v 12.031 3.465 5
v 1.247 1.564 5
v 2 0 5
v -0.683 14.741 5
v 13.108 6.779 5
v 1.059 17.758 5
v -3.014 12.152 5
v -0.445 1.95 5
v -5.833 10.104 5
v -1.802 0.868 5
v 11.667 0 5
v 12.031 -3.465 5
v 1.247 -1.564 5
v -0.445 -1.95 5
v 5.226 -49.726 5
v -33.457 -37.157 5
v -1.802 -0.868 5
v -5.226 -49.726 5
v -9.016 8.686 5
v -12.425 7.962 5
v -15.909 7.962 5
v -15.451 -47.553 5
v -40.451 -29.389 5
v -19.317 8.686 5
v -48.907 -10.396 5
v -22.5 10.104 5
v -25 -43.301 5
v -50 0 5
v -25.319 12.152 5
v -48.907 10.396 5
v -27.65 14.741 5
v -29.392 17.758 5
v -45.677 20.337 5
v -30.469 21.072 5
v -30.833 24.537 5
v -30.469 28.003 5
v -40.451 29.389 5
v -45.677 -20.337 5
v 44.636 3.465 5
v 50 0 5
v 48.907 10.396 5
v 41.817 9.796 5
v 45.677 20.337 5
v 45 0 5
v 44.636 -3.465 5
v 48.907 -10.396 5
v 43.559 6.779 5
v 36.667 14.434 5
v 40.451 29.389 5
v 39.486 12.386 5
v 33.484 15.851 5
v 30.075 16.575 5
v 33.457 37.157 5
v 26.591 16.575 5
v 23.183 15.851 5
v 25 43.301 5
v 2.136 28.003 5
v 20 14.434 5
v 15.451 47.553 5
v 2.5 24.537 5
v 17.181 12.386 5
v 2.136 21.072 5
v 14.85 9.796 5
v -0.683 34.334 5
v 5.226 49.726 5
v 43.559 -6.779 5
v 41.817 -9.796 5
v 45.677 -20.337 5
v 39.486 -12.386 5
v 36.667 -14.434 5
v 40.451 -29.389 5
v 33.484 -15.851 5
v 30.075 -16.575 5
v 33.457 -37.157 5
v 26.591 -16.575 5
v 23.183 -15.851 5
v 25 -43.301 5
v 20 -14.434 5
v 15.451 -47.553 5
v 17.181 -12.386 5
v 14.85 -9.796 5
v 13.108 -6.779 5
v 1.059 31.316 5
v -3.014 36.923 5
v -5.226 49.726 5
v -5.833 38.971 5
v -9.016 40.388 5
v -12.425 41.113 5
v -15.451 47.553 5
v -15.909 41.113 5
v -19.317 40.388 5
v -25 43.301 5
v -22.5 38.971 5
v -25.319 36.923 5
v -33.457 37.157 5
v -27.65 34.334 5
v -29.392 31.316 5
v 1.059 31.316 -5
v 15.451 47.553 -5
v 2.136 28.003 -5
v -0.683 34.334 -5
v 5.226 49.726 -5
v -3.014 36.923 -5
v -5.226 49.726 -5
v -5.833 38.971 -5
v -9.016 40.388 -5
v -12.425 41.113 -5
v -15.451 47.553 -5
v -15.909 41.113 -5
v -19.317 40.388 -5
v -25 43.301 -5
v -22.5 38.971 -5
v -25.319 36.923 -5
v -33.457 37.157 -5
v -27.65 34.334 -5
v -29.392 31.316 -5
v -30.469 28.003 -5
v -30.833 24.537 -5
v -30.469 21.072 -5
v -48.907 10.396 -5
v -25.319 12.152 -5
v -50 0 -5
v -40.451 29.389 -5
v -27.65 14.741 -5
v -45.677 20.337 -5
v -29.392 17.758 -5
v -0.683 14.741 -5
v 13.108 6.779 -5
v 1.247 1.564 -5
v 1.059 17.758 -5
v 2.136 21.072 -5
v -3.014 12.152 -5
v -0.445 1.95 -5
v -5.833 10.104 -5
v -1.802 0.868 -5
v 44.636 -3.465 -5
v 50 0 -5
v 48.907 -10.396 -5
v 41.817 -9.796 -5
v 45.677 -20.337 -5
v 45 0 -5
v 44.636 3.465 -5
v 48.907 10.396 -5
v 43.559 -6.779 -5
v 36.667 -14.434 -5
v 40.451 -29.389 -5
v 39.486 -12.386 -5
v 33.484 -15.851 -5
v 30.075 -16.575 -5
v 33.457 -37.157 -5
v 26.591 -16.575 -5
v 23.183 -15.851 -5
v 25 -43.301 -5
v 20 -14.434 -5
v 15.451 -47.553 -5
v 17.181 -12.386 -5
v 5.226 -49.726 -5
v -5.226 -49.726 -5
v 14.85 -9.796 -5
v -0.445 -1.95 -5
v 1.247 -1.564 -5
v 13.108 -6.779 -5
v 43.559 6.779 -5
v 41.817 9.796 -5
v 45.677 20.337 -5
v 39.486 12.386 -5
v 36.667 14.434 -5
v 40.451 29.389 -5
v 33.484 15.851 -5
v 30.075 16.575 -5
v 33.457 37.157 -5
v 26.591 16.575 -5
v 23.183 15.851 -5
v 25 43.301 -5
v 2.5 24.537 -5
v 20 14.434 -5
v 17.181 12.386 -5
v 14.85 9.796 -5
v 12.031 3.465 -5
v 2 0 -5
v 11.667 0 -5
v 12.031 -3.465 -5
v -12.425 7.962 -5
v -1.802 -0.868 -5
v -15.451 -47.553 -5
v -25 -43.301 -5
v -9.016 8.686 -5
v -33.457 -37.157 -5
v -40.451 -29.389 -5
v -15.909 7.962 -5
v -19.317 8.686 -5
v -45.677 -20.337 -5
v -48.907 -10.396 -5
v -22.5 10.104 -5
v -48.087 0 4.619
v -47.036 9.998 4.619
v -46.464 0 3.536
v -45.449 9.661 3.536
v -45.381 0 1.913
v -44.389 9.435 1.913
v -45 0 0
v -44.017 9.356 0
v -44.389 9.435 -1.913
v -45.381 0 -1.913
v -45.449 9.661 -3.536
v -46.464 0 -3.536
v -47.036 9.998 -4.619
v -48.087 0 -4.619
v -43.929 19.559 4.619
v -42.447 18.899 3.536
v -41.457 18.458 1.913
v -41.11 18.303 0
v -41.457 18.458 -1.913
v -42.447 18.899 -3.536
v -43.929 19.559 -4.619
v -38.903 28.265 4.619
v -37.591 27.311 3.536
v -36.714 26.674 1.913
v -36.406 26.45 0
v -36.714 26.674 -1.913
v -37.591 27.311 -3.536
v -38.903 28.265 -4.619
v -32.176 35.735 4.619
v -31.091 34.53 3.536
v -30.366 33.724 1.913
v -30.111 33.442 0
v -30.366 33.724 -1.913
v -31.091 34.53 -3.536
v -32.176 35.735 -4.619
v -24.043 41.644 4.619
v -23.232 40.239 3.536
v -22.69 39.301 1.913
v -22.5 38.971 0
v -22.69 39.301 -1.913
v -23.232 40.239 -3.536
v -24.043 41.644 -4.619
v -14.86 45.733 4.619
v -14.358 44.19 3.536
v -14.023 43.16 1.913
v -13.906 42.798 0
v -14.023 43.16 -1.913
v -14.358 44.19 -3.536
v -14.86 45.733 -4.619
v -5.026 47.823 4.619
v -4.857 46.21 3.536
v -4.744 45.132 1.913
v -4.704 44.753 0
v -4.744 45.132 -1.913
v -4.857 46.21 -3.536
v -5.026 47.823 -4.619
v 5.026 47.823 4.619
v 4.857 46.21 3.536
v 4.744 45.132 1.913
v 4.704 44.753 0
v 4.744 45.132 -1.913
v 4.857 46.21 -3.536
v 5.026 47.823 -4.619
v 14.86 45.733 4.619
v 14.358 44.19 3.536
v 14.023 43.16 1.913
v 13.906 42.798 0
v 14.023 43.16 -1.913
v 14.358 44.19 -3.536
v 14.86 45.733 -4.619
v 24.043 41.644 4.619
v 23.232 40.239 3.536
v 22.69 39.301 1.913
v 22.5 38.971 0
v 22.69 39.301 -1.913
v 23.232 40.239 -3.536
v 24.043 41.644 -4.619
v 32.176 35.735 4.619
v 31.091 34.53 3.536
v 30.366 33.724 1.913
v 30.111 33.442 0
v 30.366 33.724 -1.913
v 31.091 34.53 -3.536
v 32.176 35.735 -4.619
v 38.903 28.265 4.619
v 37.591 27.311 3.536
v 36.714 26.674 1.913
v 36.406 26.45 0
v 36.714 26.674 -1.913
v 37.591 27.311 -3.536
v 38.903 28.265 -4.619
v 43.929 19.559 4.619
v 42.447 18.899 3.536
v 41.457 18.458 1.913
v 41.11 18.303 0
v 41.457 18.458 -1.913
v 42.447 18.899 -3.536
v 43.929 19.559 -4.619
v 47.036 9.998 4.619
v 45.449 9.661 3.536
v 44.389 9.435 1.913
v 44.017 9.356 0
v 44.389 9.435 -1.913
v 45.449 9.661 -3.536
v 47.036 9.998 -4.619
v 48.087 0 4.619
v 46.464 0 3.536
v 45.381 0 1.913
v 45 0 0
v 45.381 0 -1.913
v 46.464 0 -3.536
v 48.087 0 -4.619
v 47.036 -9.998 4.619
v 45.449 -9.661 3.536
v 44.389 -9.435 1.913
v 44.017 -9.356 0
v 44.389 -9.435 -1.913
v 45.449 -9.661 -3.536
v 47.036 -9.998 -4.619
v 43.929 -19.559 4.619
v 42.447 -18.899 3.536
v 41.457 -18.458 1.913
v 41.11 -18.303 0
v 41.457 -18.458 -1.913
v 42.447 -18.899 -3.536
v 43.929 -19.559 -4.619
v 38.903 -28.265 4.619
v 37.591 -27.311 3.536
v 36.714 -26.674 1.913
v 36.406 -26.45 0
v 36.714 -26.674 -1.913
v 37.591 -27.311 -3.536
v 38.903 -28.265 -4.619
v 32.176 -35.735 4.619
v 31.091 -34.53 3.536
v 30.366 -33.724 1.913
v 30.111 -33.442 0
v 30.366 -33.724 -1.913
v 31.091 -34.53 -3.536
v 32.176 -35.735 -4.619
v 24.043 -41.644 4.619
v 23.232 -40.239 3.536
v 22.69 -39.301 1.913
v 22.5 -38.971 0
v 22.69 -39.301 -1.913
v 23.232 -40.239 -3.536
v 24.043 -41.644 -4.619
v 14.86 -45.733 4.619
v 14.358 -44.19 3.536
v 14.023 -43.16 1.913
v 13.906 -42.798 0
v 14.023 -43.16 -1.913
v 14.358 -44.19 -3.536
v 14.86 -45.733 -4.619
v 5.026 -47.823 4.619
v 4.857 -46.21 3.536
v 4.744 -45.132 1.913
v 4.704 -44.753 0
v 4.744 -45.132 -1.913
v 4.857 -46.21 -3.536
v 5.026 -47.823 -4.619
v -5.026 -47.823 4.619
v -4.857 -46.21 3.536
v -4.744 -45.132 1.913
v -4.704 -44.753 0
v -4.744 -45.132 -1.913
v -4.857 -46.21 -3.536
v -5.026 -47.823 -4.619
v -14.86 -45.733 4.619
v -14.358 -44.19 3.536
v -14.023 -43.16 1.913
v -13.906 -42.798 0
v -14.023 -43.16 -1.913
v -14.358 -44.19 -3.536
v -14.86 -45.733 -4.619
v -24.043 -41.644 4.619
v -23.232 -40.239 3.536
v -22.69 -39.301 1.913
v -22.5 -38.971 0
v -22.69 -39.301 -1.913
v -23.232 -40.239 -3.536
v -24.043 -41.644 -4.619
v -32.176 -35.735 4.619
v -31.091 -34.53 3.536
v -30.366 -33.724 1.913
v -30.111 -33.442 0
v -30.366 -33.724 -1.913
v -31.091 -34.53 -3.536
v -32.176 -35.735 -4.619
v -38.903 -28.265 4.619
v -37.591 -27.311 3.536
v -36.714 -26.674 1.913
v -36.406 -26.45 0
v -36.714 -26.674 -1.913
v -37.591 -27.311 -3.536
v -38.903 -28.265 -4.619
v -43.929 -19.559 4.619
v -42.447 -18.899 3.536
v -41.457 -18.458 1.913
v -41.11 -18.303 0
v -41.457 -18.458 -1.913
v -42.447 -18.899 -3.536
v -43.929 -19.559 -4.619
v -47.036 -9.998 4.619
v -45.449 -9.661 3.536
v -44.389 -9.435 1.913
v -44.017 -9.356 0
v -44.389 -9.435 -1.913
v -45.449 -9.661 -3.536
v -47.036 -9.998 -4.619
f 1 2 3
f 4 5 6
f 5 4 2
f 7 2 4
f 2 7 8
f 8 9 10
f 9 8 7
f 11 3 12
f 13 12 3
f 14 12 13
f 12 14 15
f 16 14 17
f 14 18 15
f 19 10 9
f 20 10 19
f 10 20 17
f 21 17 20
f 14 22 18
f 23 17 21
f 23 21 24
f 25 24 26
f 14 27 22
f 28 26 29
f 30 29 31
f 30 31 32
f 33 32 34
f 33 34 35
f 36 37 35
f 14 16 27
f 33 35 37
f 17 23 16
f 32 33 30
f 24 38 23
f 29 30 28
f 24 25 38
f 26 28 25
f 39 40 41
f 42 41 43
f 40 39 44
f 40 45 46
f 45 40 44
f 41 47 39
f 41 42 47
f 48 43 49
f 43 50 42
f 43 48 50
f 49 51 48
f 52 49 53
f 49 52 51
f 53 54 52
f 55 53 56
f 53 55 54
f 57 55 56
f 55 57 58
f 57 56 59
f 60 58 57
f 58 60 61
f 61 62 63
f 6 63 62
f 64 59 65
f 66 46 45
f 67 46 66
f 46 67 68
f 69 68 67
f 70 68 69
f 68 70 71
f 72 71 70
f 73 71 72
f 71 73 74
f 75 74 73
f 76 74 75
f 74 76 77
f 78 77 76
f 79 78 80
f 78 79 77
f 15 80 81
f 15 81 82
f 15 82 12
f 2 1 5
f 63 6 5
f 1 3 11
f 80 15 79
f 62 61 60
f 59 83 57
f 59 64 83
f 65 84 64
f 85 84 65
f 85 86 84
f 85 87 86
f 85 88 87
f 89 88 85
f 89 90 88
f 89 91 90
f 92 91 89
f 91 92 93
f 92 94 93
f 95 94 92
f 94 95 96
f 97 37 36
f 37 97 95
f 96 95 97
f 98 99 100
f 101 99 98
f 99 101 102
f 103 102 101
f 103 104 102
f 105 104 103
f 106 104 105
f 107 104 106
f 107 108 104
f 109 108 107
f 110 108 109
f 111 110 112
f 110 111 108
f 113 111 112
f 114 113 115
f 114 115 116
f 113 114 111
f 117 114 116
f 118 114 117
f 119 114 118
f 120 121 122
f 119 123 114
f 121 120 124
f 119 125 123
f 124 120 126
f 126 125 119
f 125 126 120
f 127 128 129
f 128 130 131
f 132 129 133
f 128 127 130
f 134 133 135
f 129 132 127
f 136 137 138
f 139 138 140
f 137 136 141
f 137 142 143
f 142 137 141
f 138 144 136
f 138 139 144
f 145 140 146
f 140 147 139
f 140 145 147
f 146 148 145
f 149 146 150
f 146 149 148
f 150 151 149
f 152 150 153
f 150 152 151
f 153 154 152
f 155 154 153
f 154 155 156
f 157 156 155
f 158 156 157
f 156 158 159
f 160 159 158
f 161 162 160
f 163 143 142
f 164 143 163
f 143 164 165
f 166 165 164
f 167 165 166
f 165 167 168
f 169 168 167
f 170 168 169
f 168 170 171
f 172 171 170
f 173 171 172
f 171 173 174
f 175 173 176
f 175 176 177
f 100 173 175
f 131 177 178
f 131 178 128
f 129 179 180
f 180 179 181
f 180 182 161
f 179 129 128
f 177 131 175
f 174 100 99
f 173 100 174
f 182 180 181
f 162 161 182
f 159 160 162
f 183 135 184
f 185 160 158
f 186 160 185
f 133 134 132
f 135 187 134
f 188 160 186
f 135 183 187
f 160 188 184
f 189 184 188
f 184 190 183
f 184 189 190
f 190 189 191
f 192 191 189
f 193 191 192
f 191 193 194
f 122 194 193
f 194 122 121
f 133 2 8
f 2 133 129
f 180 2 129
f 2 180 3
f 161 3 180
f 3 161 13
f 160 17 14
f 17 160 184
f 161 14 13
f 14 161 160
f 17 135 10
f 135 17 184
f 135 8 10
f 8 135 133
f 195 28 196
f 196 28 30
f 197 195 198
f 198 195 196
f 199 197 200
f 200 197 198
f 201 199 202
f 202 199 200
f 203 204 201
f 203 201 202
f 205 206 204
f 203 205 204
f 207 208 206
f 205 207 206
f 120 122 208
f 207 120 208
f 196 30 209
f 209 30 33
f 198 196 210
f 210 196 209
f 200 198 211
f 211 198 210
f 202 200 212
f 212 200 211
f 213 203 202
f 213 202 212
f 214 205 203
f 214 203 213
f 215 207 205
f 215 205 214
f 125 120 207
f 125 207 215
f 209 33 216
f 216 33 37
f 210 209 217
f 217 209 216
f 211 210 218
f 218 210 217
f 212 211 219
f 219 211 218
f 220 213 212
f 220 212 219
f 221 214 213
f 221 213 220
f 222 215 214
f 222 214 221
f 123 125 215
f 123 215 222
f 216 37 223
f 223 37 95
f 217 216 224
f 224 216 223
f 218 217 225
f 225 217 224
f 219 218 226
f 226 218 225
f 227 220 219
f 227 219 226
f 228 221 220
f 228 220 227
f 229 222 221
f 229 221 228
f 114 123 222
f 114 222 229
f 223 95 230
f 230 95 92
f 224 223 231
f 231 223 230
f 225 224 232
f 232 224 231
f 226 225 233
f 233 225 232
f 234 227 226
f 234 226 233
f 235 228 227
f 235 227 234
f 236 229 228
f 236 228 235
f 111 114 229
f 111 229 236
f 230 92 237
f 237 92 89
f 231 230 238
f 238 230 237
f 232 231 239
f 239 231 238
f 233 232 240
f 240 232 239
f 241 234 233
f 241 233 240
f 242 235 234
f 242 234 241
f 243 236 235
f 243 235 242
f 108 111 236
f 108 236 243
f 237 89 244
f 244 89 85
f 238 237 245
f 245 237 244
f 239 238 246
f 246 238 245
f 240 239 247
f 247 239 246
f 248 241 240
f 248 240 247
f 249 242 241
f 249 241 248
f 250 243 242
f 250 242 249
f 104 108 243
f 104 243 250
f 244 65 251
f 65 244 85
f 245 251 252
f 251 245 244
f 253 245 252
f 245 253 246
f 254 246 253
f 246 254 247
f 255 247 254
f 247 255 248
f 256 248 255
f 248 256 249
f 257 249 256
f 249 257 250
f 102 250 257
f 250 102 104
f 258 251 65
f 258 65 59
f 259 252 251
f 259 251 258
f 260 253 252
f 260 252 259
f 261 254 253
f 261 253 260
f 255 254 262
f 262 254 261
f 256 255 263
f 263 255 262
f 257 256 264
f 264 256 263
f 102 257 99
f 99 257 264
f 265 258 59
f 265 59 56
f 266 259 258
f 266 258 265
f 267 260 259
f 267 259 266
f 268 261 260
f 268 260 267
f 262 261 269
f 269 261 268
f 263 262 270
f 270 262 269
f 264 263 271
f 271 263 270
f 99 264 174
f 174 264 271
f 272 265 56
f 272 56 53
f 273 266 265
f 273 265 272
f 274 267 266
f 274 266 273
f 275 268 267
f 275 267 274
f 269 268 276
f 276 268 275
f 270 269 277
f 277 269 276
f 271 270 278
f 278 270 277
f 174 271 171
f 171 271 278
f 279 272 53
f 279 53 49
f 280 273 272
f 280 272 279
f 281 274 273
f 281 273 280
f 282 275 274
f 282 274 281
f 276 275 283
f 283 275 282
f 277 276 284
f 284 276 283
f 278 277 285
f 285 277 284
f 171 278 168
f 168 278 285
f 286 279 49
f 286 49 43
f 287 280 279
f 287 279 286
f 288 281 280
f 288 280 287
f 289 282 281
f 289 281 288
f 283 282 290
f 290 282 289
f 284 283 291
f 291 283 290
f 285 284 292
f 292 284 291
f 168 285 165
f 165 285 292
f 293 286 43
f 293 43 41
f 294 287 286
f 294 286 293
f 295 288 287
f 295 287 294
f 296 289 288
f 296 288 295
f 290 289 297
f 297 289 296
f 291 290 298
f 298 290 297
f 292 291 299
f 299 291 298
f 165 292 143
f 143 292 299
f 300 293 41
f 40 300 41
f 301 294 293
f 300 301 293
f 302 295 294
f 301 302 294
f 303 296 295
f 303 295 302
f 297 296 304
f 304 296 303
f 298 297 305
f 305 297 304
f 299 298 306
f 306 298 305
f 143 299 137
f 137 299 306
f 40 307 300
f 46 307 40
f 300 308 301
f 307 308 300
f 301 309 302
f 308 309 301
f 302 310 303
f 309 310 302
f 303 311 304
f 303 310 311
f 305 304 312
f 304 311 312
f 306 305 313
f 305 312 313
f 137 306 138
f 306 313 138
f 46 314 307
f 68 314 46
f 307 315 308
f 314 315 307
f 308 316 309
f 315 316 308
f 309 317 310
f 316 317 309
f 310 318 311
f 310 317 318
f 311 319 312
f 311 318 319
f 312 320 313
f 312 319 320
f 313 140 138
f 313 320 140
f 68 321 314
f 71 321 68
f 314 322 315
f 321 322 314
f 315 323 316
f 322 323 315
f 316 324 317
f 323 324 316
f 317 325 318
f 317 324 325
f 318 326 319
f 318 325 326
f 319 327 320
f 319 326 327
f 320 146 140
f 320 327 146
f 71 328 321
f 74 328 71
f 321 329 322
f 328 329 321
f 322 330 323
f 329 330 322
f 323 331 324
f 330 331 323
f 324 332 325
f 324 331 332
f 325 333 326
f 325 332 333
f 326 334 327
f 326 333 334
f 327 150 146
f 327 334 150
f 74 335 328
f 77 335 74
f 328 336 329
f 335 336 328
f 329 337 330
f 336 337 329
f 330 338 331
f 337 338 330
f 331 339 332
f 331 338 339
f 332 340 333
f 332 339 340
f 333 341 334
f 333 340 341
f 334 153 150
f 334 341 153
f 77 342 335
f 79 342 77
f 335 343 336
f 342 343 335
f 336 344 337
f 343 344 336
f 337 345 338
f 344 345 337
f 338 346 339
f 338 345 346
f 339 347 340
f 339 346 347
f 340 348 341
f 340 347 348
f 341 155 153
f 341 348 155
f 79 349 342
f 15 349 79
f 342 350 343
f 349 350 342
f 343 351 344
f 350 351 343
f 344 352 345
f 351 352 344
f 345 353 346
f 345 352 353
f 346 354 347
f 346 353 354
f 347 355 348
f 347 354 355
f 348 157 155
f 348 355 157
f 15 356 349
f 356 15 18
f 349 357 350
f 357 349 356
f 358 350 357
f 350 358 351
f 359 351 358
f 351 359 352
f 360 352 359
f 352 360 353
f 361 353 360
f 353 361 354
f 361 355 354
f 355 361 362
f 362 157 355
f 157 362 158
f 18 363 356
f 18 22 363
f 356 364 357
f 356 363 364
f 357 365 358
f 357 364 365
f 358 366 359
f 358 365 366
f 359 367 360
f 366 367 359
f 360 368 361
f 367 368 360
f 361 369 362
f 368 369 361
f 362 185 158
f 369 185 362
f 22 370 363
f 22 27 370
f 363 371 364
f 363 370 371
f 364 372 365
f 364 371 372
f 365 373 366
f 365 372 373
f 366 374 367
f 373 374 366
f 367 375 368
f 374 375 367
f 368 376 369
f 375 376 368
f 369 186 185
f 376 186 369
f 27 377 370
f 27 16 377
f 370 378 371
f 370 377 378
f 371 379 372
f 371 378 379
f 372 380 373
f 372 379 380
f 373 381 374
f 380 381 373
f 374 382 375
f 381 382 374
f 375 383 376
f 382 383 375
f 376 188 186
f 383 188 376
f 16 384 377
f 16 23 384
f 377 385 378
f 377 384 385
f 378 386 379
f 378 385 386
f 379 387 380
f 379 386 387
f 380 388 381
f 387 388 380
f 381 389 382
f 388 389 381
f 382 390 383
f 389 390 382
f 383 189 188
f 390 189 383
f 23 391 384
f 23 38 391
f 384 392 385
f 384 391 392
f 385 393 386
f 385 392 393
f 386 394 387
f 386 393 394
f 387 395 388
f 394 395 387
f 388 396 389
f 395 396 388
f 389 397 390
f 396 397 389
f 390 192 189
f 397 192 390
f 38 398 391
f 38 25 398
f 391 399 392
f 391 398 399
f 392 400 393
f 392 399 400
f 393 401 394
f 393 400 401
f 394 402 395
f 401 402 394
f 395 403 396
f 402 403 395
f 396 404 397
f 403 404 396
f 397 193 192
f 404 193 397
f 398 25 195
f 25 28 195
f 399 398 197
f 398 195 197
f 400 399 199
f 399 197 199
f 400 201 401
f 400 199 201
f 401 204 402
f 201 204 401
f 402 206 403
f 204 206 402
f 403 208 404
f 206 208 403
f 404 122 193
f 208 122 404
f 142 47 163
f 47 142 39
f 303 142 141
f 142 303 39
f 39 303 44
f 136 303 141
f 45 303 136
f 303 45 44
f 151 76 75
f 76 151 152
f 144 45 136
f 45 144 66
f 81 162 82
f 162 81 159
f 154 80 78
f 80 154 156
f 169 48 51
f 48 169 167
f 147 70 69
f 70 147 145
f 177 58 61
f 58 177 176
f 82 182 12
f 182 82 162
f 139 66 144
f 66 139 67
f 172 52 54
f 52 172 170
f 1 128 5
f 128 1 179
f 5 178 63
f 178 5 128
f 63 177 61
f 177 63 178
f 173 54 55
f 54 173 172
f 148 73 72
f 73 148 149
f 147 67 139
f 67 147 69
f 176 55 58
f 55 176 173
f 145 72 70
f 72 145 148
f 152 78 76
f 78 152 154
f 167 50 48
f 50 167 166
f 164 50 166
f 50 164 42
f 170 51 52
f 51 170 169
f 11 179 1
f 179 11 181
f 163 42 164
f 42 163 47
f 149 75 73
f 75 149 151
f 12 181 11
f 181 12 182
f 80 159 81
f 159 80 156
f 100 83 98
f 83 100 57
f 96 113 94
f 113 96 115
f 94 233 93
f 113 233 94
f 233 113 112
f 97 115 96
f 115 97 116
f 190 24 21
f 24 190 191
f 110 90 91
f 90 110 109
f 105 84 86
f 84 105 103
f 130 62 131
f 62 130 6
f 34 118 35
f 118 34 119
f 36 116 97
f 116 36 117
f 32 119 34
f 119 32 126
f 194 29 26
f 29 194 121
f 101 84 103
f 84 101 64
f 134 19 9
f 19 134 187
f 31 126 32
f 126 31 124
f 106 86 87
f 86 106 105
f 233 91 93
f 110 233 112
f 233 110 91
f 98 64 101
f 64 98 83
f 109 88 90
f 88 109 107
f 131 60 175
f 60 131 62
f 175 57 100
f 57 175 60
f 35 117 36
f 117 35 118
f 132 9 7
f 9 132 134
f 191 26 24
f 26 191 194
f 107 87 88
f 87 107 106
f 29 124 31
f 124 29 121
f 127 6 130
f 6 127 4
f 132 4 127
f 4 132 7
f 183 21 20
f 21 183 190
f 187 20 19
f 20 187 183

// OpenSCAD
//#import( "disc.stl" );

/**
 * Disc
 * Modul parametrického disku k robotovi. Jedná se o kolo s gumovou pneumatikou o kruhovém průřezu.
 * @param radius Poloměr disku
 * @param height Výška disku
 * @param r_hole Poloměr díry uprostřed kola
 * @param reduce_offset Odsazení odlehčujících děr od stran kola
 * @param reduce_num Počet odlehčujících děr
 * @author Marek Žehra
 */
 
module wheel (
  radius=50,
  height=10,
  r_hole=2,
  reduce_offset=5,
  reduce_num=2
) {
    difference() {
        difference() {
            cylinder(r=radius, h=height, center=true);
            cylinder(r=r_hole, h=height,center=true);
            rotate_extrude() {
            translate([radius, 0, 0]) circle(d=height);
            }
        }
        for(i=[0:reduce_num-1]) {
            rotate([0,0,360/max(3,reduce_num)*i])
        translate([radius-(radius/3)-reduce_offset,0,0]) cylinder( d=(radius/2.5)/max(3,reduce_num)*5, h=height, center=true );
        }
    }
}

wheel();
